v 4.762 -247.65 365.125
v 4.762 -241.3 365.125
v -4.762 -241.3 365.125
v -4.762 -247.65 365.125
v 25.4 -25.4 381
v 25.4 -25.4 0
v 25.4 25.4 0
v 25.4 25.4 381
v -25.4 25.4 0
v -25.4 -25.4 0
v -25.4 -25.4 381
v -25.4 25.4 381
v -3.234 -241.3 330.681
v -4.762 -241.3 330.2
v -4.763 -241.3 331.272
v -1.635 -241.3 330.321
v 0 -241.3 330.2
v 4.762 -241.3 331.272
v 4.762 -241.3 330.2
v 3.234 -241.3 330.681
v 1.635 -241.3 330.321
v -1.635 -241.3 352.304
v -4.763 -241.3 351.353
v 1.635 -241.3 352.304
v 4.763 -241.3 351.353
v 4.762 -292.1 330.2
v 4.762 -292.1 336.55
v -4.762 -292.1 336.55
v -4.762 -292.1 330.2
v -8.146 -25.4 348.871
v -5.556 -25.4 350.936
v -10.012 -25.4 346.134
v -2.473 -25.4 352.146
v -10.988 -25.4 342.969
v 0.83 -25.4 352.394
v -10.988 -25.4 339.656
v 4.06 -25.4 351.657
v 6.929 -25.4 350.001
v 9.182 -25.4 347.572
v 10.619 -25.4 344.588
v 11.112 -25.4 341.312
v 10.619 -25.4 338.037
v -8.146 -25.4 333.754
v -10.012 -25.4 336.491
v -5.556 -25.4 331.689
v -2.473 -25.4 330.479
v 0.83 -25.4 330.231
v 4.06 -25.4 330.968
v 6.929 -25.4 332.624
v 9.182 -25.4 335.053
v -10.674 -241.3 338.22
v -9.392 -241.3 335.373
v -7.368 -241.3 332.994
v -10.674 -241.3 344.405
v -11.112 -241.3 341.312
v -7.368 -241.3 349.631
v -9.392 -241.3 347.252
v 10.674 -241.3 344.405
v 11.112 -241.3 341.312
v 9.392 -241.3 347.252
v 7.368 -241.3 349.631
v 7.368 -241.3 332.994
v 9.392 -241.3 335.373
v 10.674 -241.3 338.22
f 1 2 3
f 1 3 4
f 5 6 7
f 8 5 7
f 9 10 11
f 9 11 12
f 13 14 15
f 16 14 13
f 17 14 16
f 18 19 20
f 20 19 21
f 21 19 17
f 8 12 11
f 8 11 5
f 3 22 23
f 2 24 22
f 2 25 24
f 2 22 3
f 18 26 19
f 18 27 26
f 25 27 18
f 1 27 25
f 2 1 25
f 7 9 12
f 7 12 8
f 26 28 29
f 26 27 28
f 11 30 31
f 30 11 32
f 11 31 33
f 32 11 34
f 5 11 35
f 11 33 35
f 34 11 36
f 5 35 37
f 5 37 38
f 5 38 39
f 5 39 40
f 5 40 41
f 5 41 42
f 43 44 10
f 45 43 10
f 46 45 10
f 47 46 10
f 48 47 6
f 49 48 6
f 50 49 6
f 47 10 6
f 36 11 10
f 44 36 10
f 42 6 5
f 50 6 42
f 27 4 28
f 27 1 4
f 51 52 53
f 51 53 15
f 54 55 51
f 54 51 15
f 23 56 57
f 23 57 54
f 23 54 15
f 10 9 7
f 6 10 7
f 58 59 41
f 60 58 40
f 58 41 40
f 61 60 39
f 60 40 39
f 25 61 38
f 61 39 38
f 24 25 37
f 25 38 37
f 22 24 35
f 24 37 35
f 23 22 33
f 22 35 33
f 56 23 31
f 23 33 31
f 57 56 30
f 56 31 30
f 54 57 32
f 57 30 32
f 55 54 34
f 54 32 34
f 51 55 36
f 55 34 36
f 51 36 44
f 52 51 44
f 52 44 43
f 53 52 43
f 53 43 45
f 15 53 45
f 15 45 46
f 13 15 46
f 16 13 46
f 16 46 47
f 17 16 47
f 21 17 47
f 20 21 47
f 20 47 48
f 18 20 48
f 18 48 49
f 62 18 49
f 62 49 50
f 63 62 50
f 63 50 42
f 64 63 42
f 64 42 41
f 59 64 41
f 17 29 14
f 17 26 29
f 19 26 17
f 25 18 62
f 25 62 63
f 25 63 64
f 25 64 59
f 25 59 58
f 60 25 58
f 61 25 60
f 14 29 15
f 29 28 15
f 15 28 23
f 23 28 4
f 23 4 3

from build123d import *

# Parameters (mm, degrees)
F0_W          = 50.8
F0_H          = 50.8
F1_DEPTH      = 381
F2_R          = 11.1125
F3_DEPTH      = 215.9
F5_DEPTH      = 4.7625
F5_DEPTH_BACK = 4.7625


# Not quite as in the source:
# - the program builds the solid bodies; features that only make, move or delete a surface that nothing else refers to are left out


with BuildPart() as f1:
    # F0 (on Top) → F1 (new body)
    with BuildSketch(Plane.XY):
        Rectangle(F0_W, F0_H)
    extrude(amount=F1_DEPTH)

    # F2 (on face) → F3 (join)
    with BuildSketch(Plane.XZ.offset(25.4)):
        with Locations((0, 341.3125)):
            Circle(F2_R)
    extrude(amount=F3_DEPTH)

    # F4 (on Right) → F5 (join, two sides)
    with BuildSketch(Plane.YZ) as f5_sk:
        Polygon((-292.1, 330.2), (-241.3, 330.2), (-241.3, 365.125), (-247.65, 365.125), (-292.1, 336.55), align=None)
    extrude(amount=F5_DEPTH)
    extrude(f5_sk.sketch, amount=-F5_DEPTH_BACK)


solid = f1.part
